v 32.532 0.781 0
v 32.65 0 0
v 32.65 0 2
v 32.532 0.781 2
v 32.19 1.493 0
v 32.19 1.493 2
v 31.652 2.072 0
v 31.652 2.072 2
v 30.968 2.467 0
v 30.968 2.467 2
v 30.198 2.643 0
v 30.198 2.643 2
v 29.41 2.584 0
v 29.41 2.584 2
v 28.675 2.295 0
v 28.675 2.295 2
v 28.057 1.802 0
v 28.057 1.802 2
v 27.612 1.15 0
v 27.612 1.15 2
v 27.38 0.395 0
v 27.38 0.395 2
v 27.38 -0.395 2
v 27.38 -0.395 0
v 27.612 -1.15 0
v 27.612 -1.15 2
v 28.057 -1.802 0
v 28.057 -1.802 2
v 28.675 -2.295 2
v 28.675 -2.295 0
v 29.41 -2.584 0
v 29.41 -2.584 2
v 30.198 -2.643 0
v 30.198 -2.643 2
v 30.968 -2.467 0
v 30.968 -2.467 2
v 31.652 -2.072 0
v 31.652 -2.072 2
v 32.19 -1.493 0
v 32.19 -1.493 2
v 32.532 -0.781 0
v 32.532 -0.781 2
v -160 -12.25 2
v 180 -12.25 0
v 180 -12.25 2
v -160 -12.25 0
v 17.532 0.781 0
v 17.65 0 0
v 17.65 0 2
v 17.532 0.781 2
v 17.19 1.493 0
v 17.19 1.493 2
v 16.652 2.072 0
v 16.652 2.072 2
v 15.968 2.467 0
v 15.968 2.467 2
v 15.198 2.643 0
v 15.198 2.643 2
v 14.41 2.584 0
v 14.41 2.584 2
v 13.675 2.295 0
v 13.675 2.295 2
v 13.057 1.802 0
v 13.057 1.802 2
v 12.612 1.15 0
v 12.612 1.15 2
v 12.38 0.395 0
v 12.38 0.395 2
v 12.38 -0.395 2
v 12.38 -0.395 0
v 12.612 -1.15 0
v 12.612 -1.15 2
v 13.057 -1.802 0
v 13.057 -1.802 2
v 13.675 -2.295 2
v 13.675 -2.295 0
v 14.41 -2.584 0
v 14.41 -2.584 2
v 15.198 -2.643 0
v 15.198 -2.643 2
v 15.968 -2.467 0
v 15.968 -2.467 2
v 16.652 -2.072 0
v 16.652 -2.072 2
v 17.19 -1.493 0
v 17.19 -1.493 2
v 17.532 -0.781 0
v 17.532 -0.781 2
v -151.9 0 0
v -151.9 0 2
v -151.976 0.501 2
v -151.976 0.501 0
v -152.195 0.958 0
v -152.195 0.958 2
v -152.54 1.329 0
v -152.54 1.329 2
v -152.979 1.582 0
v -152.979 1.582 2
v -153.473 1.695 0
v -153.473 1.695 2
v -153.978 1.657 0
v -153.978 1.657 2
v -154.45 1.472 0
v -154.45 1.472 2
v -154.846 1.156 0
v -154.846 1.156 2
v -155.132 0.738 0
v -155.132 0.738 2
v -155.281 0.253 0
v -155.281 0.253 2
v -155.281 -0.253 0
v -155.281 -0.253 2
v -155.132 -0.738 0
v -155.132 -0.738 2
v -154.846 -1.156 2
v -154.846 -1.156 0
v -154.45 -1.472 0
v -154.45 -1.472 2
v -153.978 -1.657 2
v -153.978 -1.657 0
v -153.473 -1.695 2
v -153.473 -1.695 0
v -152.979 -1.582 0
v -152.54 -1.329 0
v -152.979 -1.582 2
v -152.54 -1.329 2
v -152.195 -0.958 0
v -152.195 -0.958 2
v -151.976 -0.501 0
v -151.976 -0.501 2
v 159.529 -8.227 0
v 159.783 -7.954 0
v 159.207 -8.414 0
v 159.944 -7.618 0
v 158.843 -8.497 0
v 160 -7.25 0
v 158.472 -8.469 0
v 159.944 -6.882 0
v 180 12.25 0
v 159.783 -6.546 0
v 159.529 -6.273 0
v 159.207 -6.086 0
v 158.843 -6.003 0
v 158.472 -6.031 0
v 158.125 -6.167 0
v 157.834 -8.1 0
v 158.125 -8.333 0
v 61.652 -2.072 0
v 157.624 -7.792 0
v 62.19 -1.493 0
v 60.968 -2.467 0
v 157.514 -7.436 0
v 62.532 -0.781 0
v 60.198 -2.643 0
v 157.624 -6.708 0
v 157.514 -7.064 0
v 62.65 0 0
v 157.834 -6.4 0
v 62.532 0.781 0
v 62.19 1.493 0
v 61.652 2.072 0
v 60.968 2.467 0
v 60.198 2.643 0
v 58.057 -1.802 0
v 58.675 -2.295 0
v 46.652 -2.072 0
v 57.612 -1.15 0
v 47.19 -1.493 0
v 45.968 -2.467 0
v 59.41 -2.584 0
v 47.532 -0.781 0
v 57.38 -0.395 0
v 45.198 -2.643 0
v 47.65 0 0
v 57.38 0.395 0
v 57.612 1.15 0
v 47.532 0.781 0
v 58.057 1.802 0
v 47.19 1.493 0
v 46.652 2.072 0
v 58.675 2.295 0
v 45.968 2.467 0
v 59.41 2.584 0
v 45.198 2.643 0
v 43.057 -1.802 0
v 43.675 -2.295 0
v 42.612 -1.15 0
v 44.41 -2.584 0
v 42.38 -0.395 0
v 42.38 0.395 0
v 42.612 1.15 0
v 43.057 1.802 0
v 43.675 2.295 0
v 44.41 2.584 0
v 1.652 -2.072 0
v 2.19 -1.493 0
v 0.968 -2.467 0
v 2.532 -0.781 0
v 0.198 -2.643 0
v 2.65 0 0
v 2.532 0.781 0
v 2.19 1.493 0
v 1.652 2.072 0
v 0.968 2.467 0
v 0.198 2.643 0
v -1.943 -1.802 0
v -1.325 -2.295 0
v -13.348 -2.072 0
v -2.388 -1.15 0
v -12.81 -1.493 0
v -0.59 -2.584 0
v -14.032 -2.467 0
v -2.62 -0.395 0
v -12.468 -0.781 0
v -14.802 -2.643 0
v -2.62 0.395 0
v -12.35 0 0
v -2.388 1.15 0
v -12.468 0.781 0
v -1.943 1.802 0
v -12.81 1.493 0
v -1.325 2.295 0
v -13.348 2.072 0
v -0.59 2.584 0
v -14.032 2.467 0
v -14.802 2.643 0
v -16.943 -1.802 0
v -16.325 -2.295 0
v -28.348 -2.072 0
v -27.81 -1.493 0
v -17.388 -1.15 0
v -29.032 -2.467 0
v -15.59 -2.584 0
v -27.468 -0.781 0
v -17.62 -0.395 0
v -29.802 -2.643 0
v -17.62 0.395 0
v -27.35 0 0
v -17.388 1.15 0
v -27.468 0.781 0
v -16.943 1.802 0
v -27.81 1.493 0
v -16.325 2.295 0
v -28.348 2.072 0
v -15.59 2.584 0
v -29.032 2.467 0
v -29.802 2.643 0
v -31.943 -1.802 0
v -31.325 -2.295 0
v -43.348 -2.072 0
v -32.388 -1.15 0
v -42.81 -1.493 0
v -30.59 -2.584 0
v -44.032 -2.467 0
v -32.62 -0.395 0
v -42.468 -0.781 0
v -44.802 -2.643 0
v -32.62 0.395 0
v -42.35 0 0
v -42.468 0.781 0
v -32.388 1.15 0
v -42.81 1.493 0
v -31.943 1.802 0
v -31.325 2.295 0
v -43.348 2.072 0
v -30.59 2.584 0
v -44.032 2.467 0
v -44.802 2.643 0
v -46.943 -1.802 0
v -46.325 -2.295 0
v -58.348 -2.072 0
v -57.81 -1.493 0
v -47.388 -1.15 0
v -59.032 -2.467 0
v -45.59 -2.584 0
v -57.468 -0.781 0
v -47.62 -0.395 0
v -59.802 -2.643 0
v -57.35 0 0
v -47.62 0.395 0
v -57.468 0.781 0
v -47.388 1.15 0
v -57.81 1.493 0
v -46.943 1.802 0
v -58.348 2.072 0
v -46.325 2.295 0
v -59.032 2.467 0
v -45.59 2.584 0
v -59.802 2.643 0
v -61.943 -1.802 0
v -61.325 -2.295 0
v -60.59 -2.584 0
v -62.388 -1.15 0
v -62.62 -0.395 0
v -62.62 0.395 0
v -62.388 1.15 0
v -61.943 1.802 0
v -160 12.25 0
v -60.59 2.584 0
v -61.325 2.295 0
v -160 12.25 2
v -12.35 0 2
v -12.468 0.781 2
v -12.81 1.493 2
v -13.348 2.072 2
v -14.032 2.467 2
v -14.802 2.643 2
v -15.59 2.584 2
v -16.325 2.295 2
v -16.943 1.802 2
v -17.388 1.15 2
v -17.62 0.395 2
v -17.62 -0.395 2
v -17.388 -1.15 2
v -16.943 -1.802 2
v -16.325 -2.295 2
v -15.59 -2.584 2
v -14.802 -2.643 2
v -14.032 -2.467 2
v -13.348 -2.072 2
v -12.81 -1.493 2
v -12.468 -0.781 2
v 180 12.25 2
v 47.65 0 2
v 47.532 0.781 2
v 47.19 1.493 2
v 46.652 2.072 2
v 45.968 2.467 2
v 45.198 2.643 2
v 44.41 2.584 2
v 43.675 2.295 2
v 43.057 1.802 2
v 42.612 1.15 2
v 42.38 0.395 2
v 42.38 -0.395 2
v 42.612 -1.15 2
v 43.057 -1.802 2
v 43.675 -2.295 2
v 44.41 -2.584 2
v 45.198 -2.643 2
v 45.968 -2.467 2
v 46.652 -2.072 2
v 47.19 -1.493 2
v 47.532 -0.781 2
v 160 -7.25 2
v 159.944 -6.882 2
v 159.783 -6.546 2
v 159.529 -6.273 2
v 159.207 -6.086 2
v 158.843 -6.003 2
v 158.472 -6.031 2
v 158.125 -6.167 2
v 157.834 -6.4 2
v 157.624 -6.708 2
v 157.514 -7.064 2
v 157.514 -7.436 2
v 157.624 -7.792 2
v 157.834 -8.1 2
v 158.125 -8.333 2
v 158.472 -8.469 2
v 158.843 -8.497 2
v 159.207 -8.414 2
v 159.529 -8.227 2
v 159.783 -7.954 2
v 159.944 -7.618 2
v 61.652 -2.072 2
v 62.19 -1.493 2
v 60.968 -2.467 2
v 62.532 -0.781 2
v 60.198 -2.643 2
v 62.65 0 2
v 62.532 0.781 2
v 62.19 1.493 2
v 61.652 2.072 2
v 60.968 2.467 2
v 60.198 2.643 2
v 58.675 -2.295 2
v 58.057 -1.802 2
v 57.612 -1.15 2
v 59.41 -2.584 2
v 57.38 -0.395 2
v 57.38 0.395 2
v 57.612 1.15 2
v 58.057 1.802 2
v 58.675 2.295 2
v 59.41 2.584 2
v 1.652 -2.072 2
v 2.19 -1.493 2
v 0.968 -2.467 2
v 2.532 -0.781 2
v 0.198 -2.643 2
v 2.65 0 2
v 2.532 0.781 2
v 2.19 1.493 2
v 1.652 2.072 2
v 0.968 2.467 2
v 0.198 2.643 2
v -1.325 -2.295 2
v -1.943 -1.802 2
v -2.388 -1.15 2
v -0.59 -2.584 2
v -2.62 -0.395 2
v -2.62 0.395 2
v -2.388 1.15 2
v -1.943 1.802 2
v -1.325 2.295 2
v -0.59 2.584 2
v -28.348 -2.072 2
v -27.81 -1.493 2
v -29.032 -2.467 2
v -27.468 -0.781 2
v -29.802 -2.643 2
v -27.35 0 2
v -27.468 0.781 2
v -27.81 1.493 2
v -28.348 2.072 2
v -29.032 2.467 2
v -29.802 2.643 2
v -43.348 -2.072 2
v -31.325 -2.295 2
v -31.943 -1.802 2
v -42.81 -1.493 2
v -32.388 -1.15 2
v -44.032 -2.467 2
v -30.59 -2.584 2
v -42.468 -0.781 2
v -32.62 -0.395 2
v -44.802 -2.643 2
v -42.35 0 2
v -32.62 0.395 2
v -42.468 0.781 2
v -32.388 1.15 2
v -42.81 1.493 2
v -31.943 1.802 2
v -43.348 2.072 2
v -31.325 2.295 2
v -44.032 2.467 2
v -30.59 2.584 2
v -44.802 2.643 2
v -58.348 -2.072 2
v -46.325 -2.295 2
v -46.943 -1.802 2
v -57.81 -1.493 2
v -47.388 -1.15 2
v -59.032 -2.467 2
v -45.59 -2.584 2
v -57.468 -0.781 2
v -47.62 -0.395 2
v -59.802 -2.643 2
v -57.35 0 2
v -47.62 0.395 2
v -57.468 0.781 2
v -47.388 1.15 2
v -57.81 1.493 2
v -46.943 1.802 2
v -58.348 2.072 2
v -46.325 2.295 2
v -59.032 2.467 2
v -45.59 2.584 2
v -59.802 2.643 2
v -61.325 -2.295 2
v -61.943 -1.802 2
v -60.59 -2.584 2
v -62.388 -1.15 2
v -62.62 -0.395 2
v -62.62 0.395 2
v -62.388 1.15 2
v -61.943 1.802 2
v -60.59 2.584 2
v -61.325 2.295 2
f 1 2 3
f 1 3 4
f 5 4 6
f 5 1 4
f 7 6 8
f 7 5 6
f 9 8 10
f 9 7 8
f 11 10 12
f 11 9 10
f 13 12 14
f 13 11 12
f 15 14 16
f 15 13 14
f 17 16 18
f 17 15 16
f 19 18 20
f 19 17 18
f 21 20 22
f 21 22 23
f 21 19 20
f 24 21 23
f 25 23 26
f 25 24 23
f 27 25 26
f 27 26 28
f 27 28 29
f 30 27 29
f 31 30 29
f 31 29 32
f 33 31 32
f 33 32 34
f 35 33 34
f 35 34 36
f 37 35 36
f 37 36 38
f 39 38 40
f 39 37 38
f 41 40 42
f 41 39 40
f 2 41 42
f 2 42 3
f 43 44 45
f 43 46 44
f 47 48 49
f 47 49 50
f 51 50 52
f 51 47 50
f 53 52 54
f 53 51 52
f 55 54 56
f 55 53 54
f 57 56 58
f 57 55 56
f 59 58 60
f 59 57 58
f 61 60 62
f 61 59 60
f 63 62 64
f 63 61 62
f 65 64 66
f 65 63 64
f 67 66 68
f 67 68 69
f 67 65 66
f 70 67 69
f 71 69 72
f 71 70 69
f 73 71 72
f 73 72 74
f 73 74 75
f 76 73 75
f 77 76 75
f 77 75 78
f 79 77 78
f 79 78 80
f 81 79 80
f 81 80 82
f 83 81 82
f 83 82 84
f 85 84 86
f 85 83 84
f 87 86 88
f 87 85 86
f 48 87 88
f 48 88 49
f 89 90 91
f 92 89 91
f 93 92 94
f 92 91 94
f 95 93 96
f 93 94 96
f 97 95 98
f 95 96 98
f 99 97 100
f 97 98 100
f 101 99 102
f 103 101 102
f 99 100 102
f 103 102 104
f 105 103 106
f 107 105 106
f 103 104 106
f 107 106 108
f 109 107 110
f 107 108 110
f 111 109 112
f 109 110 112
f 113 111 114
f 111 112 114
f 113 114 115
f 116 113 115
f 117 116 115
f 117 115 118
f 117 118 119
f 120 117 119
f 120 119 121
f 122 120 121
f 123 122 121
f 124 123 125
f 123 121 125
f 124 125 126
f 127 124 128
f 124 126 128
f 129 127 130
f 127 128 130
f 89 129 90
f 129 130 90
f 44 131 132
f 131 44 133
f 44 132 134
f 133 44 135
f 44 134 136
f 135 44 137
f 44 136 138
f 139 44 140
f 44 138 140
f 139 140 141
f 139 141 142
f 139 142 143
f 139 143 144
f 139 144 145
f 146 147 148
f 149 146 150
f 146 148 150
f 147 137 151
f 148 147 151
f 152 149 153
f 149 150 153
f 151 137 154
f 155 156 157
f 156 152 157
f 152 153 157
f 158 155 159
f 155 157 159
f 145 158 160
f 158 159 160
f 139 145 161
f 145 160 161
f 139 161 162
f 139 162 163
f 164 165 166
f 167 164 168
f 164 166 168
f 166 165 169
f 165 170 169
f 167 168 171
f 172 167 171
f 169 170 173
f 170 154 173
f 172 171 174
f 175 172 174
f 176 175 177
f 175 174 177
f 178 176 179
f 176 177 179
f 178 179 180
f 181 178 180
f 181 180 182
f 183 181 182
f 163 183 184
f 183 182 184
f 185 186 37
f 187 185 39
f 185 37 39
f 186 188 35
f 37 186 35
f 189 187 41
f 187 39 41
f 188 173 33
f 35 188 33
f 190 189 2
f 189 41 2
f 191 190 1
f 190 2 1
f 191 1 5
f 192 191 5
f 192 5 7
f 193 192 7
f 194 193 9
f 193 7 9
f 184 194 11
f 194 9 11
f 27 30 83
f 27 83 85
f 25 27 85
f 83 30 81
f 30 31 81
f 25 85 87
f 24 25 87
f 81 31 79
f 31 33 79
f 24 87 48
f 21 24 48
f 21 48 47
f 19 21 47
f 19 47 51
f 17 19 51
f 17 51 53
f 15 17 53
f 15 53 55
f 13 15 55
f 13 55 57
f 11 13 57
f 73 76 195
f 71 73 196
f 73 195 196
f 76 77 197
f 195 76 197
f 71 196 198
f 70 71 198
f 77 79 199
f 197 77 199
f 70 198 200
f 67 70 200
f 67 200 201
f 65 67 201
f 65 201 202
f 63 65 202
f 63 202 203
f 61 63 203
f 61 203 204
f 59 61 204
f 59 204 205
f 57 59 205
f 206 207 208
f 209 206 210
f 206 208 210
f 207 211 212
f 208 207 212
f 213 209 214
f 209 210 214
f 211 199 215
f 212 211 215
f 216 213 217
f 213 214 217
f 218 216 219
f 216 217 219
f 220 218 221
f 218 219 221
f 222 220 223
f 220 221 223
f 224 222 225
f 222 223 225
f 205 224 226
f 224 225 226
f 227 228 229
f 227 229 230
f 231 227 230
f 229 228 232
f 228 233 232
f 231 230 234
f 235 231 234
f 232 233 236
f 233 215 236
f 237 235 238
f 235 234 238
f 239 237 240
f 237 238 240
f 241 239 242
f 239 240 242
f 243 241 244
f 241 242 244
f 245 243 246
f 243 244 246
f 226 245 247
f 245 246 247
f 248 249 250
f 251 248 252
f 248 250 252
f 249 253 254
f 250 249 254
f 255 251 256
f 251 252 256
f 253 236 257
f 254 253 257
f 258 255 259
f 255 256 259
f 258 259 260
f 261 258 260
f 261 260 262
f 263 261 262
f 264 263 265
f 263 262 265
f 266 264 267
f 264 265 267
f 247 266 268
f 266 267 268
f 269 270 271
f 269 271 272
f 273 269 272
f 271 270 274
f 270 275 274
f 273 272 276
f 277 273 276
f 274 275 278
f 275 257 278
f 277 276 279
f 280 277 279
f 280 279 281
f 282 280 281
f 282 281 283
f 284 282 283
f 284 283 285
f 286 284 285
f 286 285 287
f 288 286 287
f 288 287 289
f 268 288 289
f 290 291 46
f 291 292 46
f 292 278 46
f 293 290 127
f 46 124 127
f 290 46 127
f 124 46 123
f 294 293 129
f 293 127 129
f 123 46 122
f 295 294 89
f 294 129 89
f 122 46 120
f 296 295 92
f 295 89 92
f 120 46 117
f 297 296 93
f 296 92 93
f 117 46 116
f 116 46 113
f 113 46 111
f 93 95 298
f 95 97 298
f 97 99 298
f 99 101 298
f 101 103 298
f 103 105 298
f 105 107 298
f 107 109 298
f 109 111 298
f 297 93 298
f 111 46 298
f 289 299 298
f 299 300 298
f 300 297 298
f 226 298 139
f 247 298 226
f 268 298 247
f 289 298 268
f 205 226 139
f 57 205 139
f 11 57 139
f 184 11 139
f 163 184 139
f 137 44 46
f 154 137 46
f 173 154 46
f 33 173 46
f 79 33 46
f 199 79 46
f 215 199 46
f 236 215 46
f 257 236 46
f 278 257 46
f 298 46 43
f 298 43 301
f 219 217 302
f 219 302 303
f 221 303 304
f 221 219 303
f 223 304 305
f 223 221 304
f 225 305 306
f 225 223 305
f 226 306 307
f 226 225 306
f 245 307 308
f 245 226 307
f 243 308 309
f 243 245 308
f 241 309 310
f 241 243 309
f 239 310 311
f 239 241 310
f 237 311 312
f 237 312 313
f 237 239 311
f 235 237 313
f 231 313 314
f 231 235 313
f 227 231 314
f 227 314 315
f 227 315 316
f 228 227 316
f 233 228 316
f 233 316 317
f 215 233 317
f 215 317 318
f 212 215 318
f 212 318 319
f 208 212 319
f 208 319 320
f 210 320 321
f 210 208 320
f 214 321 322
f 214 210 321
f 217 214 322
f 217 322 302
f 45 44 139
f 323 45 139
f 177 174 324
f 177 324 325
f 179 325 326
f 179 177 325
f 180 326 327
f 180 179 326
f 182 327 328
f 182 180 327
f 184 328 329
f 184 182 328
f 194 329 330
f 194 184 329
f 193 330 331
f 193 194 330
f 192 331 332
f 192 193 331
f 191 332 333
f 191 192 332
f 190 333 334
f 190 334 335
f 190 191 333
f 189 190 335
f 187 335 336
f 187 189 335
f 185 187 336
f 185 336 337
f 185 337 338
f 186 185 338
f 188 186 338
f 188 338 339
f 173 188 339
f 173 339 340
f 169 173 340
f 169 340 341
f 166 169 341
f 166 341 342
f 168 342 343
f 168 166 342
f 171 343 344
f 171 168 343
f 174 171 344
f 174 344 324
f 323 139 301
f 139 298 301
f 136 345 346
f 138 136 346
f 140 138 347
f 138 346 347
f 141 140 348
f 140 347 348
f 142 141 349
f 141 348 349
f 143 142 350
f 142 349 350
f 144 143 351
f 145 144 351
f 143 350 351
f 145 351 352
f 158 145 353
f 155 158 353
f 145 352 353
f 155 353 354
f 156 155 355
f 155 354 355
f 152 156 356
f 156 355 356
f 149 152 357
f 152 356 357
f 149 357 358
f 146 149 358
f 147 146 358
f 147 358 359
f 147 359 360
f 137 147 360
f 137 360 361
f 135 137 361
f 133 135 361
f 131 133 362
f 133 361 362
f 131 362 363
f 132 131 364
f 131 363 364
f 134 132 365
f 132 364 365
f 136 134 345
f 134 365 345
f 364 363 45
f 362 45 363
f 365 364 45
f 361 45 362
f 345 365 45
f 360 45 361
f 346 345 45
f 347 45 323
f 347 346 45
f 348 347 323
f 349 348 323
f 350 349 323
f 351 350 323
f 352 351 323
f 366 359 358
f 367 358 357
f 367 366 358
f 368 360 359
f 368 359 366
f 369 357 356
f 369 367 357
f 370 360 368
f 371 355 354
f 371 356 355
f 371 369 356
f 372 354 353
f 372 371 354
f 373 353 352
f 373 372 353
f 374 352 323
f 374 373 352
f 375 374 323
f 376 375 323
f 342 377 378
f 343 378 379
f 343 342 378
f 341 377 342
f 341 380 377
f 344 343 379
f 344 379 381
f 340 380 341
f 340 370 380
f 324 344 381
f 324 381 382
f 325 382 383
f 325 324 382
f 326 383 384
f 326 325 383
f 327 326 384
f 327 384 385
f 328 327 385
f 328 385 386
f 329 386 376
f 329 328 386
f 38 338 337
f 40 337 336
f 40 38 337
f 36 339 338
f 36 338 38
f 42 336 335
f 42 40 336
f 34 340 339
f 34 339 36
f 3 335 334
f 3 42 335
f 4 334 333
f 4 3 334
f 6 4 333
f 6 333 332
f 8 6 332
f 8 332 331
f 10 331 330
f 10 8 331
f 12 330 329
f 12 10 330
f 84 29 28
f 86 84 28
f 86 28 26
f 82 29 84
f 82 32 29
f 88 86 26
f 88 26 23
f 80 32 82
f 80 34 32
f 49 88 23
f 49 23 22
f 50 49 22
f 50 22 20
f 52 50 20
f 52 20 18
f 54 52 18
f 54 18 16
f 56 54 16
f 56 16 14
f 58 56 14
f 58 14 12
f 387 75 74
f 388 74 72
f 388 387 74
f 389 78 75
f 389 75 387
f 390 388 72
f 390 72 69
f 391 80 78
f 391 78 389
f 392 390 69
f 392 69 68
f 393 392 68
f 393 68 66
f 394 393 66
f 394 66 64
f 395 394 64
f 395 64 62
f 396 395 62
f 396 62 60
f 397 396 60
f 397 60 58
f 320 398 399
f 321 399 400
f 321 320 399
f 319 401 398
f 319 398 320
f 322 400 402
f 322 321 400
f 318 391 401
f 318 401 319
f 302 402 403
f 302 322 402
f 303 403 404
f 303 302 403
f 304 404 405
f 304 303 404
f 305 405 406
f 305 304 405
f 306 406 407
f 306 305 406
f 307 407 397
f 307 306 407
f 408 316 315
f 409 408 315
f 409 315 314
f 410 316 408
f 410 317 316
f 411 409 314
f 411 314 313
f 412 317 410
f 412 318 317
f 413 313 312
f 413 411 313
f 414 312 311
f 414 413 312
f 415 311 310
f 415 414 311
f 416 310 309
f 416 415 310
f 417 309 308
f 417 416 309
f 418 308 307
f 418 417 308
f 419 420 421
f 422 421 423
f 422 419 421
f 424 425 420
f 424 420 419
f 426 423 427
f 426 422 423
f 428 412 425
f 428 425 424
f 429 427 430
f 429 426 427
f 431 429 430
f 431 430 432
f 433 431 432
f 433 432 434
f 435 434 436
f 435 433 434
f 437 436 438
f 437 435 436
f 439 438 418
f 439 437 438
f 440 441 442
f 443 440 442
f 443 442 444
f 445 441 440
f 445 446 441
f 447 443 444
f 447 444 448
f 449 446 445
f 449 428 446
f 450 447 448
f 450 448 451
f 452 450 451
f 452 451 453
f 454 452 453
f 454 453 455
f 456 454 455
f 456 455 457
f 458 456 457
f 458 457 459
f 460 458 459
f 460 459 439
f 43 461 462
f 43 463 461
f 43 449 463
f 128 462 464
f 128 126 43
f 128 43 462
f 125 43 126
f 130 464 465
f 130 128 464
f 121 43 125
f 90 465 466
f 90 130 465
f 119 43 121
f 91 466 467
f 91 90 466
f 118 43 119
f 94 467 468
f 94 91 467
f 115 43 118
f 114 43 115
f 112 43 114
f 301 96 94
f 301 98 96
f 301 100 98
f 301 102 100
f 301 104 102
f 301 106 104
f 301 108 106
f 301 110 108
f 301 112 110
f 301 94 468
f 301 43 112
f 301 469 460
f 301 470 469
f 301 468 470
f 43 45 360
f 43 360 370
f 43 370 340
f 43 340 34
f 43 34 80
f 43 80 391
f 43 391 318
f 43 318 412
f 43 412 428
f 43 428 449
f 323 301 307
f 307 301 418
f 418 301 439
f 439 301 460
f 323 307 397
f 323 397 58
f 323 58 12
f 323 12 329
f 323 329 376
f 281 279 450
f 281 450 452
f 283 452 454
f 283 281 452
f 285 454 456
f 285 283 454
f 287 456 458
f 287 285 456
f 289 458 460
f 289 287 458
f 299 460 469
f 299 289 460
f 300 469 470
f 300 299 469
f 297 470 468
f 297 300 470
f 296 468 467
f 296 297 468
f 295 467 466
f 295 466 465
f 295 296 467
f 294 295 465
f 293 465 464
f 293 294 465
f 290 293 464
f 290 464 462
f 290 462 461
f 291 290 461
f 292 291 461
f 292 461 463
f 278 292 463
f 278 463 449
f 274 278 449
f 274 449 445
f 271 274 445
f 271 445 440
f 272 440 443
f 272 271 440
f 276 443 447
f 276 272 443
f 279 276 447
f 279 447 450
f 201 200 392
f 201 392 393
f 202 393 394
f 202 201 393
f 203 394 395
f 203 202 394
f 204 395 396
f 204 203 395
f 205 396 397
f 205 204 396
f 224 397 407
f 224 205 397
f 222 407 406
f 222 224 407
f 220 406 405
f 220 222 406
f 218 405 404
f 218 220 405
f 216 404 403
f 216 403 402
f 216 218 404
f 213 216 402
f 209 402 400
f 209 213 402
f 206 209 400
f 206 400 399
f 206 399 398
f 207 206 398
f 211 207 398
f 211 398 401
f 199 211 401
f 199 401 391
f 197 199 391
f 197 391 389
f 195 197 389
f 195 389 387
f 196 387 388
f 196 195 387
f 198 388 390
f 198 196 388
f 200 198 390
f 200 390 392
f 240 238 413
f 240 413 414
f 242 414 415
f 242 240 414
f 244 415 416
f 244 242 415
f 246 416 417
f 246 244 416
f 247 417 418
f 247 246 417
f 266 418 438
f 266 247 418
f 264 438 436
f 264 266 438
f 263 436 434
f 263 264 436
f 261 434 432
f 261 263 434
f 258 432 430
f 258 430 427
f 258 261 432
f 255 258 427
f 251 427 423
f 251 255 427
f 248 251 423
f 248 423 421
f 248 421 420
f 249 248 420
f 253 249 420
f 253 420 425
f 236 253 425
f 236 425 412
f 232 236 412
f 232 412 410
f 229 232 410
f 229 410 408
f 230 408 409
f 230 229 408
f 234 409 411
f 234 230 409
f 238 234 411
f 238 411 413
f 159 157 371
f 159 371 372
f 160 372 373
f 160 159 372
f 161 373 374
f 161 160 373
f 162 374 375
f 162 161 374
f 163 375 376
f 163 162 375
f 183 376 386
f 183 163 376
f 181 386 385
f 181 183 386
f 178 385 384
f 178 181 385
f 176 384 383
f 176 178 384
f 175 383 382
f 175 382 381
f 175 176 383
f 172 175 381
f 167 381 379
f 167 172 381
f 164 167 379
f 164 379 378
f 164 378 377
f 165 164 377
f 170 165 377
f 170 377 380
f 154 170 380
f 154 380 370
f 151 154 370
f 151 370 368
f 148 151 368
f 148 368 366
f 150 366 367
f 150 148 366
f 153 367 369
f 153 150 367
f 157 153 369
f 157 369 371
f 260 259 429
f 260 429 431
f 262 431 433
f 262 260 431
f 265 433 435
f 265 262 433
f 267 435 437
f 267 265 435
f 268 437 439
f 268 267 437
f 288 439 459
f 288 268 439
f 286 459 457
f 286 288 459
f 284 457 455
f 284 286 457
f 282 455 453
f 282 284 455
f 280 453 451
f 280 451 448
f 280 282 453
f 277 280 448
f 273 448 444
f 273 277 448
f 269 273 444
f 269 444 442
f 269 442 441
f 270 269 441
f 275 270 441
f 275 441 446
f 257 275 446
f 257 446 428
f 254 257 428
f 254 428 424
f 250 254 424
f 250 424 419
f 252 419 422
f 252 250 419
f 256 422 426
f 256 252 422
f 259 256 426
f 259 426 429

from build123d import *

# Parameters (mm, degrees)
F0_W     = 300
F0_H     = 24.5
F0_R     = 2.65
F1_DEPTH = 2
F2_DEPTH = 10
F3_DEPTH = 30
F4_R     = 1.7
F5_DEPTH = 2
F6_R     = 1.25
F7_DEPTH = 2


with BuildPart() as f1:
    # F0 (on Top) → F1 (new body)
    with BuildSketch(Plane.XY):
        Rectangle(F0_W, F0_H)
        with Locations((-60, 0)):
            Circle(F0_R, mode=Mode.SUBTRACT)
        with Locations((-45, 0)):
            Circle(F0_R, mode=Mode.SUBTRACT)
        with Locations((-30, 0)):
            Circle(F0_R, mode=Mode.SUBTRACT)
        with Locations((-15, 0)):
            Circle(F0_R, mode=Mode.SUBTRACT)
        Circle(F0_R, mode=Mode.SUBTRACT)
        with Locations((15, 0)):
            Circle(F0_R, mode=Mode.SUBTRACT)
        with Locations((30, 0)):
            Circle(F0_R, mode=Mode.SUBTRACT)
        with Locations((45, 0)):
            Circle(F0_R, mode=Mode.SUBTRACT)
        with Locations((60, 0)):
            Circle(F0_R, mode=Mode.SUBTRACT)
    extrude(amount=F1_DEPTH)

    # F2 (add): a face of the model
    f2_faces = [f1.faces().sort_by_distance(p)[0] for p in [
        (-150, 0, 1),
    ]]
    extrude(f2_faces, amount=F2_DEPTH)

    # F3 (add): a face of the model
    f3_faces = [f1.faces().sort_by_distance(p)[0] for p in [
        (150, 0, 1),
    ]]
    extrude(f3_faces, amount=F3_DEPTH)

    # F4 (on face) → F5 (cut, through all)
    with BuildSketch(Plane.XY.offset(2)):
        with Locations((-153.6, 0)):
            Circle(F4_R)
    extrude(amount=-F5_DEPTH, mode=Mode.SUBTRACT)

    # F6 (on face) → F7 (cut, through all)
    with BuildSketch(Plane.XY.offset(2)):
        with Locations((158.75, -7.25)):
            Circle(F6_R)
    extrude(amount=-F7_DEPTH, mode=Mode.SUBTRACT)


solid = f1.part
